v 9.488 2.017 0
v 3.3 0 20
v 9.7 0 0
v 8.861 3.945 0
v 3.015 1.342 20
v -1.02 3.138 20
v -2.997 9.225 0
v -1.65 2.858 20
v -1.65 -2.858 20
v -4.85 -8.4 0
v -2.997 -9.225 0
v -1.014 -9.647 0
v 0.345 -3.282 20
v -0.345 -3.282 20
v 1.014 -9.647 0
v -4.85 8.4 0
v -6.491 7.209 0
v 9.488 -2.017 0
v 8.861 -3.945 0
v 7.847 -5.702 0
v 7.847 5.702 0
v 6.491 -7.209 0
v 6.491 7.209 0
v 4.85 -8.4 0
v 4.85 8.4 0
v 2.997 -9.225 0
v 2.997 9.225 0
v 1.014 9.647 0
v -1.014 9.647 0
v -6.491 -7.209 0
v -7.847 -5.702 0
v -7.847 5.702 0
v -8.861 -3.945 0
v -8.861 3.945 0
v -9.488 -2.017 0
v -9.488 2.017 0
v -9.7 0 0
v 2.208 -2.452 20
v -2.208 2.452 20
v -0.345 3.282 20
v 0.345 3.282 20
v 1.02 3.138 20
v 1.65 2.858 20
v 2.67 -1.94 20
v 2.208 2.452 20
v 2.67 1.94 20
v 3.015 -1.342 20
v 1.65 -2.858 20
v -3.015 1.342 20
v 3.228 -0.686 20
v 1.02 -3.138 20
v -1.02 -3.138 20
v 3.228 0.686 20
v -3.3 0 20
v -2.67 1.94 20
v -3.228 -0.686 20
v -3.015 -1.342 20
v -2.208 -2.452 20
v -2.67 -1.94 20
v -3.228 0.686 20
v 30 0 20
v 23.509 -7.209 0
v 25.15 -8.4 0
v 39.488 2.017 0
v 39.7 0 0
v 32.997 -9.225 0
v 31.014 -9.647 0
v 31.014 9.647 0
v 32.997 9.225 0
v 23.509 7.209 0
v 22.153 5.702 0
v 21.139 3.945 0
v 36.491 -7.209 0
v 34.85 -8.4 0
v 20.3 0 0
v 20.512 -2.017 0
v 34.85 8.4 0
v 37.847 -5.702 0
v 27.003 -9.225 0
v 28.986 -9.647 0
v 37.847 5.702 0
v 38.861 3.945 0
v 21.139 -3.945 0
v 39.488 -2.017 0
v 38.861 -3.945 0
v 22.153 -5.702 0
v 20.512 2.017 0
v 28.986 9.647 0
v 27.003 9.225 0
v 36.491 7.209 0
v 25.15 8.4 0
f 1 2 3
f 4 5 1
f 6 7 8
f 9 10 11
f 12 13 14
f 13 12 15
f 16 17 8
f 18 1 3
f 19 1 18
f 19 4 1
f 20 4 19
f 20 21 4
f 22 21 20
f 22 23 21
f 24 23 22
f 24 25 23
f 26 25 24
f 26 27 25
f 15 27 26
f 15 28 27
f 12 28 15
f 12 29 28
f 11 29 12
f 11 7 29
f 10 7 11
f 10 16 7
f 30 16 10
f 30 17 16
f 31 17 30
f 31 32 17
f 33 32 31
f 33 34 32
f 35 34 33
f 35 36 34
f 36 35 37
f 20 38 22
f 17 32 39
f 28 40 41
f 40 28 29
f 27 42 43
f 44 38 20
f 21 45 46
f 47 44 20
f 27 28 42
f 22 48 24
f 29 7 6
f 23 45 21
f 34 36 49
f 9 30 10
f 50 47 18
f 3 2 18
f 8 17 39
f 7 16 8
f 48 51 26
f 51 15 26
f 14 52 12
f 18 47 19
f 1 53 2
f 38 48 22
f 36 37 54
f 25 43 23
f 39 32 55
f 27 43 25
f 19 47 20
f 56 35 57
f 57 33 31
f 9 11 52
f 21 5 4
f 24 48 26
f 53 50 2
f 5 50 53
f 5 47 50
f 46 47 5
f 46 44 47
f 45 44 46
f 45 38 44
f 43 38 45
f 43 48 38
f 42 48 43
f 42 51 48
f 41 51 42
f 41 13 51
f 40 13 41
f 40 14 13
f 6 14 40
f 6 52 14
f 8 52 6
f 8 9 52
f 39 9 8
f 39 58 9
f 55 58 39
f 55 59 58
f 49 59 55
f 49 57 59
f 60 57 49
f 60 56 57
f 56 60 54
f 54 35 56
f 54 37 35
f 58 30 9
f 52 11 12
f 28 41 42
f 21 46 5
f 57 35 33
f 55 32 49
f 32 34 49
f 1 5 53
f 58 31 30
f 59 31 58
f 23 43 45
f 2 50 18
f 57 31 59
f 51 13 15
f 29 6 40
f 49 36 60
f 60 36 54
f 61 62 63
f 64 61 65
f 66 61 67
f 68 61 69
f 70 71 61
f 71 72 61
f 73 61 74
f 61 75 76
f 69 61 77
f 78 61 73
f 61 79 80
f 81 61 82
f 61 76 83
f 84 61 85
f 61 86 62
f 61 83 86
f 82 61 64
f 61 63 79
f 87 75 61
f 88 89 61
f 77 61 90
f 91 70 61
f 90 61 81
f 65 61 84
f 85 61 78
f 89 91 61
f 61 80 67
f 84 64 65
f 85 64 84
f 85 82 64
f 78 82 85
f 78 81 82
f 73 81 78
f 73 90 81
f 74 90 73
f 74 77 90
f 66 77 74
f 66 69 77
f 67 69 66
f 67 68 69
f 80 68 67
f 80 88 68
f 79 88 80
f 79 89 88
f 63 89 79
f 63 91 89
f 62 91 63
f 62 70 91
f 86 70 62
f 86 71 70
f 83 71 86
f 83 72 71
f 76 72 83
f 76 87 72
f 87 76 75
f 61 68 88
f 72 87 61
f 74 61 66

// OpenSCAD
cylinder(h = 20, r1 = 9.7, r2 = 3.3);
translate([30,0,0]) cylinder(h = 20, d1 = 19.4, d2 = 0.0001);
